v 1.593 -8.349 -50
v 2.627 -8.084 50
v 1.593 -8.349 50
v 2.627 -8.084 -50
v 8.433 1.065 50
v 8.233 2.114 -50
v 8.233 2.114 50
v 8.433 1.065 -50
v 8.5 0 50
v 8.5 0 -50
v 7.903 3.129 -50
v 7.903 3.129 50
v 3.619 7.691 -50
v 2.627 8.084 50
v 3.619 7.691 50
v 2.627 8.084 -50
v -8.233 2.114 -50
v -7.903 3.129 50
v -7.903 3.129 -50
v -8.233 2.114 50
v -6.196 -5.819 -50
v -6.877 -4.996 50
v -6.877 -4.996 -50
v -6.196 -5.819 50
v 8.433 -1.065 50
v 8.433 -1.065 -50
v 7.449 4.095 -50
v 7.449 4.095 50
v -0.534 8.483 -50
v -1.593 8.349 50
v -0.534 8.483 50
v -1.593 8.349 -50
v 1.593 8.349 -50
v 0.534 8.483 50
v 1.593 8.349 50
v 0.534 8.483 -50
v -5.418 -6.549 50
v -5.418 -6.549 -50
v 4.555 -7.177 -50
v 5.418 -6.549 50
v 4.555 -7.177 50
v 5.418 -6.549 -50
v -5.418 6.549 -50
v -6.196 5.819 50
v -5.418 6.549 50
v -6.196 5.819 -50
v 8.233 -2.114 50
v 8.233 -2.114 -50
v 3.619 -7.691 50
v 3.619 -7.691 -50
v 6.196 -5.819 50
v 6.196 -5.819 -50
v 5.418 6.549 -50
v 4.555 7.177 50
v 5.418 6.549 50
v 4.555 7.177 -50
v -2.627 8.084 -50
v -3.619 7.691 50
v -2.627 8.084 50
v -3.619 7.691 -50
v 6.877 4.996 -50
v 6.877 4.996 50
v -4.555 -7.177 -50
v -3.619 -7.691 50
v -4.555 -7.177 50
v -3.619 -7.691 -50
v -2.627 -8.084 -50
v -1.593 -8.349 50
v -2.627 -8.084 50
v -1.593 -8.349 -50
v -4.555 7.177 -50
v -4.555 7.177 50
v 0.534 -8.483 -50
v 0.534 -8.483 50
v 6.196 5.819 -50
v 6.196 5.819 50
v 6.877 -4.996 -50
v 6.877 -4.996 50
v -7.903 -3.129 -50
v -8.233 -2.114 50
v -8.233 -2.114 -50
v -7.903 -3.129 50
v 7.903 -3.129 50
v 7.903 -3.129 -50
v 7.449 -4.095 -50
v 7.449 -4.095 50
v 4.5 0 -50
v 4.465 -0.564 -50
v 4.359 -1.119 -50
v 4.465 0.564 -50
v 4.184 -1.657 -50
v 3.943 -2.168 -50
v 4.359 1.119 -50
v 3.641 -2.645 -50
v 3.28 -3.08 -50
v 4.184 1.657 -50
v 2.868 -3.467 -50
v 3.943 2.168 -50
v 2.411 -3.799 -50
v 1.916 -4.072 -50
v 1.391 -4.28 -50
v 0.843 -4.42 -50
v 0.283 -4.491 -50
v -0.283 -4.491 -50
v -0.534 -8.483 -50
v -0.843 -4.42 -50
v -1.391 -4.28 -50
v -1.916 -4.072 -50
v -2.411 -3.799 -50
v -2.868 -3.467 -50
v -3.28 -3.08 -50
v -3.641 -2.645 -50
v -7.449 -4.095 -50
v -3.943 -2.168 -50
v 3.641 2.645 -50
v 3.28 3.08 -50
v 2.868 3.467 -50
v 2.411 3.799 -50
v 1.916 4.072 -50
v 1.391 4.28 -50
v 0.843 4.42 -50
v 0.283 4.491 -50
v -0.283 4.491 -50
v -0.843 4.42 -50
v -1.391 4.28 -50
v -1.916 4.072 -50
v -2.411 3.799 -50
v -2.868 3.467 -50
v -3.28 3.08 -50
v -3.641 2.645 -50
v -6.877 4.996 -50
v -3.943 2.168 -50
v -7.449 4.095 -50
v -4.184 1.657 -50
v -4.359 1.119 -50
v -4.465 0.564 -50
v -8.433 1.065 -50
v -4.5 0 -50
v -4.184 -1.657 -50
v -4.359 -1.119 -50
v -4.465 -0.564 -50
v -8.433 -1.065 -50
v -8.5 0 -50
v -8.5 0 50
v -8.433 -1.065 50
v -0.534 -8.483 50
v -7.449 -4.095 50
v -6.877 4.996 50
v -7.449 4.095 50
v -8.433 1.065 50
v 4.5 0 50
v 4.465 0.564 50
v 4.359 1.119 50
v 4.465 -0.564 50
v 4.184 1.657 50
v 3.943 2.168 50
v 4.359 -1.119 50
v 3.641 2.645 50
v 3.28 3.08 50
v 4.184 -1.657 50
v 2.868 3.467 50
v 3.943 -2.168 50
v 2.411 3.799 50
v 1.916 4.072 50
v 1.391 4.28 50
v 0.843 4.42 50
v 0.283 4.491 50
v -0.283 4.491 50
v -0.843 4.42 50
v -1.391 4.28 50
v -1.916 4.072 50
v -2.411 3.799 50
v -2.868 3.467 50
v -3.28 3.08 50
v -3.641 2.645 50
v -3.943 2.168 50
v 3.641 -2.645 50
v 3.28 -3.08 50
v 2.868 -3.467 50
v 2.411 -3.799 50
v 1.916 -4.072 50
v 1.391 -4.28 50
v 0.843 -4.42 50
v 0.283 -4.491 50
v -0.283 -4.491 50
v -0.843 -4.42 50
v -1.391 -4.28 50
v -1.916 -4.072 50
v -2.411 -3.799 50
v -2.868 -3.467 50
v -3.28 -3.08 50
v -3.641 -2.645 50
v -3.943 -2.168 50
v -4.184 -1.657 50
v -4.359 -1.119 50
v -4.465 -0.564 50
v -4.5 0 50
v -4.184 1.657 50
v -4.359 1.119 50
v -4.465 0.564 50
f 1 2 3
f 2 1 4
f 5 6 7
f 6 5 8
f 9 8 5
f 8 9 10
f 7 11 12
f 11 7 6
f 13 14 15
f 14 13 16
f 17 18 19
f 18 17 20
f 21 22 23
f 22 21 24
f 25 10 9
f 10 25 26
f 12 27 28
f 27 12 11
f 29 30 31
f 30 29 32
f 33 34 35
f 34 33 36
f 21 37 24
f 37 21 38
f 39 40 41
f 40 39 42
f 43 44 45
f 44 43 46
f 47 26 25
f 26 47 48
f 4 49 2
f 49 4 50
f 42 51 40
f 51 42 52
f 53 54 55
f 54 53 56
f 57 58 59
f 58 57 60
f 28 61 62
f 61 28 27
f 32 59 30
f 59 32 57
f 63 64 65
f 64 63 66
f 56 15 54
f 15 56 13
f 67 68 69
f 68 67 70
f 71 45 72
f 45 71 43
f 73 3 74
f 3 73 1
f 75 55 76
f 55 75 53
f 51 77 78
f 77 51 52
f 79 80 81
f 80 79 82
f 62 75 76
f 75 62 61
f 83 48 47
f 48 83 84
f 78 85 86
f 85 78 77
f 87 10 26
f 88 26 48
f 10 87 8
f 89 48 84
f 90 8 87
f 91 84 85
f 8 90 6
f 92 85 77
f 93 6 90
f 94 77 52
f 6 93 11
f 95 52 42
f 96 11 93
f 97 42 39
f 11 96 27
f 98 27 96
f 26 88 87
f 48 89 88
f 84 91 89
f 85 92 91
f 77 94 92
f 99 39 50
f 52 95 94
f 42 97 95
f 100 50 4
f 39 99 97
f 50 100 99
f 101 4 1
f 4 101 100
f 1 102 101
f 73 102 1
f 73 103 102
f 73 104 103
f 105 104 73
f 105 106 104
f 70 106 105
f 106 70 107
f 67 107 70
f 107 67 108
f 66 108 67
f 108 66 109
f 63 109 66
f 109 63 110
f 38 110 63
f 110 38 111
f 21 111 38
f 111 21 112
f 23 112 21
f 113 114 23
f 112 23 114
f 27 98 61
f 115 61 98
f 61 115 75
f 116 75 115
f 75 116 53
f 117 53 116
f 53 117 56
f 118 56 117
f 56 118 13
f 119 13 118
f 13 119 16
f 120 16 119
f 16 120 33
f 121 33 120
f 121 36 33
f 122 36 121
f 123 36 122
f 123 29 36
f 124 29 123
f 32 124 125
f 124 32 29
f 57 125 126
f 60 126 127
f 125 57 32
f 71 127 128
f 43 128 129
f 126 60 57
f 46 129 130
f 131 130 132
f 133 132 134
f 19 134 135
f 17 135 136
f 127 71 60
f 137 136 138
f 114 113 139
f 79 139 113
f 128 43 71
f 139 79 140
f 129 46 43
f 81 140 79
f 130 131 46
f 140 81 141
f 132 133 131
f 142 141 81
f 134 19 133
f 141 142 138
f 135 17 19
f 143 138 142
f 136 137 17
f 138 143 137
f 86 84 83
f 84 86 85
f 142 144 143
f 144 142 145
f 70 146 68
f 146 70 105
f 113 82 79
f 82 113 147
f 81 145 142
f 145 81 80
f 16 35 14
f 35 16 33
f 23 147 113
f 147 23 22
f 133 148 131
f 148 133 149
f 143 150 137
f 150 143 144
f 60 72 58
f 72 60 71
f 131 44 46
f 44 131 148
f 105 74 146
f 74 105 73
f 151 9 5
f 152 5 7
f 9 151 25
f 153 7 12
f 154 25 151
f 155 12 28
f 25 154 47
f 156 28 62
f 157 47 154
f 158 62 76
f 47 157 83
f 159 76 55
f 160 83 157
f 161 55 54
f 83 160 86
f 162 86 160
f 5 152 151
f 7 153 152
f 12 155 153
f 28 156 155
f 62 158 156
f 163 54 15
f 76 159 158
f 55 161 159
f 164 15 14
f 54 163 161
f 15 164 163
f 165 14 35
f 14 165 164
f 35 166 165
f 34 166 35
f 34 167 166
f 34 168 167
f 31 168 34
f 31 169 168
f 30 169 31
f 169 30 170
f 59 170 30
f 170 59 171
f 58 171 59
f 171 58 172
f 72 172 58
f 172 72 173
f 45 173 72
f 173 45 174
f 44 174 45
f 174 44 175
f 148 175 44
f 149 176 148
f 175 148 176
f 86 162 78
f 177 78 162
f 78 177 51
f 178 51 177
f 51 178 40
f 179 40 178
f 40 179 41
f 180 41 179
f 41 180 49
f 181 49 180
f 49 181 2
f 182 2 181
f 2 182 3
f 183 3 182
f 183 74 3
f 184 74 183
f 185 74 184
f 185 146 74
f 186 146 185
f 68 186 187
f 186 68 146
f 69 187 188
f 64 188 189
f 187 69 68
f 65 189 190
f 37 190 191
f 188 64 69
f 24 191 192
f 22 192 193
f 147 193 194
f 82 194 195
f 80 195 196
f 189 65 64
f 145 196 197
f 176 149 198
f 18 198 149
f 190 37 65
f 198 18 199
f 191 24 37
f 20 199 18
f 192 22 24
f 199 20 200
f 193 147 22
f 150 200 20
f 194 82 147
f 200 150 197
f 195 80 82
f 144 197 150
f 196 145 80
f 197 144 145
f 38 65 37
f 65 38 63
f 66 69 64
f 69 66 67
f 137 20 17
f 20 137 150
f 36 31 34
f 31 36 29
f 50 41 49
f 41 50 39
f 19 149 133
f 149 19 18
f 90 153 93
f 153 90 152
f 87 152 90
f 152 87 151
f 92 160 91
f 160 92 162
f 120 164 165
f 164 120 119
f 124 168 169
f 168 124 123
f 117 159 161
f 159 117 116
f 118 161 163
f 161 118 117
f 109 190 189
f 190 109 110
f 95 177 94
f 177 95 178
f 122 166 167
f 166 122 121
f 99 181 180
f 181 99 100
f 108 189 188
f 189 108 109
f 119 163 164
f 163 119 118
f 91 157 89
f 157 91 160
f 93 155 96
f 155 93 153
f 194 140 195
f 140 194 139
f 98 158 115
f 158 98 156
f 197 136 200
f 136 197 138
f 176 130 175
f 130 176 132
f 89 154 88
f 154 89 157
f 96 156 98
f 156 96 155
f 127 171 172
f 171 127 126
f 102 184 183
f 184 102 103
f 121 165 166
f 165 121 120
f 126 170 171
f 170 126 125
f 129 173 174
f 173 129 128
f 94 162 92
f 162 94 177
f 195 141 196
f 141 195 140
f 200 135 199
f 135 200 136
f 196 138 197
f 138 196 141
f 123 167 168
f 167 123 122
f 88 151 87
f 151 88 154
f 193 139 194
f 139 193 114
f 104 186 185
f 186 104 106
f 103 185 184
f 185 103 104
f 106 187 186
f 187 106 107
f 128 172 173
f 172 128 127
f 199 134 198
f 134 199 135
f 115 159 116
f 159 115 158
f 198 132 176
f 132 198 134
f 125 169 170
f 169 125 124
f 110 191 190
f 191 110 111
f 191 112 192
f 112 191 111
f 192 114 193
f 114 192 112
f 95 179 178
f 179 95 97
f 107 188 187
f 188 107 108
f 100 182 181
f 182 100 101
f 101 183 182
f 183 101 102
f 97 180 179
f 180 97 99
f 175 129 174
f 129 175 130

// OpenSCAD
$fn = 50;


difference() {
	union() {
		translate(v = [0, 0, -50.0000000000]) {
			cylinder(h = 100, r = 8.5000000000);
		}
	}
	union() {
		translate(v = [0, 0, -100.0000000000]) {
			cylinder(h = 200, r = 4.5000000000);
		}
	}
}
